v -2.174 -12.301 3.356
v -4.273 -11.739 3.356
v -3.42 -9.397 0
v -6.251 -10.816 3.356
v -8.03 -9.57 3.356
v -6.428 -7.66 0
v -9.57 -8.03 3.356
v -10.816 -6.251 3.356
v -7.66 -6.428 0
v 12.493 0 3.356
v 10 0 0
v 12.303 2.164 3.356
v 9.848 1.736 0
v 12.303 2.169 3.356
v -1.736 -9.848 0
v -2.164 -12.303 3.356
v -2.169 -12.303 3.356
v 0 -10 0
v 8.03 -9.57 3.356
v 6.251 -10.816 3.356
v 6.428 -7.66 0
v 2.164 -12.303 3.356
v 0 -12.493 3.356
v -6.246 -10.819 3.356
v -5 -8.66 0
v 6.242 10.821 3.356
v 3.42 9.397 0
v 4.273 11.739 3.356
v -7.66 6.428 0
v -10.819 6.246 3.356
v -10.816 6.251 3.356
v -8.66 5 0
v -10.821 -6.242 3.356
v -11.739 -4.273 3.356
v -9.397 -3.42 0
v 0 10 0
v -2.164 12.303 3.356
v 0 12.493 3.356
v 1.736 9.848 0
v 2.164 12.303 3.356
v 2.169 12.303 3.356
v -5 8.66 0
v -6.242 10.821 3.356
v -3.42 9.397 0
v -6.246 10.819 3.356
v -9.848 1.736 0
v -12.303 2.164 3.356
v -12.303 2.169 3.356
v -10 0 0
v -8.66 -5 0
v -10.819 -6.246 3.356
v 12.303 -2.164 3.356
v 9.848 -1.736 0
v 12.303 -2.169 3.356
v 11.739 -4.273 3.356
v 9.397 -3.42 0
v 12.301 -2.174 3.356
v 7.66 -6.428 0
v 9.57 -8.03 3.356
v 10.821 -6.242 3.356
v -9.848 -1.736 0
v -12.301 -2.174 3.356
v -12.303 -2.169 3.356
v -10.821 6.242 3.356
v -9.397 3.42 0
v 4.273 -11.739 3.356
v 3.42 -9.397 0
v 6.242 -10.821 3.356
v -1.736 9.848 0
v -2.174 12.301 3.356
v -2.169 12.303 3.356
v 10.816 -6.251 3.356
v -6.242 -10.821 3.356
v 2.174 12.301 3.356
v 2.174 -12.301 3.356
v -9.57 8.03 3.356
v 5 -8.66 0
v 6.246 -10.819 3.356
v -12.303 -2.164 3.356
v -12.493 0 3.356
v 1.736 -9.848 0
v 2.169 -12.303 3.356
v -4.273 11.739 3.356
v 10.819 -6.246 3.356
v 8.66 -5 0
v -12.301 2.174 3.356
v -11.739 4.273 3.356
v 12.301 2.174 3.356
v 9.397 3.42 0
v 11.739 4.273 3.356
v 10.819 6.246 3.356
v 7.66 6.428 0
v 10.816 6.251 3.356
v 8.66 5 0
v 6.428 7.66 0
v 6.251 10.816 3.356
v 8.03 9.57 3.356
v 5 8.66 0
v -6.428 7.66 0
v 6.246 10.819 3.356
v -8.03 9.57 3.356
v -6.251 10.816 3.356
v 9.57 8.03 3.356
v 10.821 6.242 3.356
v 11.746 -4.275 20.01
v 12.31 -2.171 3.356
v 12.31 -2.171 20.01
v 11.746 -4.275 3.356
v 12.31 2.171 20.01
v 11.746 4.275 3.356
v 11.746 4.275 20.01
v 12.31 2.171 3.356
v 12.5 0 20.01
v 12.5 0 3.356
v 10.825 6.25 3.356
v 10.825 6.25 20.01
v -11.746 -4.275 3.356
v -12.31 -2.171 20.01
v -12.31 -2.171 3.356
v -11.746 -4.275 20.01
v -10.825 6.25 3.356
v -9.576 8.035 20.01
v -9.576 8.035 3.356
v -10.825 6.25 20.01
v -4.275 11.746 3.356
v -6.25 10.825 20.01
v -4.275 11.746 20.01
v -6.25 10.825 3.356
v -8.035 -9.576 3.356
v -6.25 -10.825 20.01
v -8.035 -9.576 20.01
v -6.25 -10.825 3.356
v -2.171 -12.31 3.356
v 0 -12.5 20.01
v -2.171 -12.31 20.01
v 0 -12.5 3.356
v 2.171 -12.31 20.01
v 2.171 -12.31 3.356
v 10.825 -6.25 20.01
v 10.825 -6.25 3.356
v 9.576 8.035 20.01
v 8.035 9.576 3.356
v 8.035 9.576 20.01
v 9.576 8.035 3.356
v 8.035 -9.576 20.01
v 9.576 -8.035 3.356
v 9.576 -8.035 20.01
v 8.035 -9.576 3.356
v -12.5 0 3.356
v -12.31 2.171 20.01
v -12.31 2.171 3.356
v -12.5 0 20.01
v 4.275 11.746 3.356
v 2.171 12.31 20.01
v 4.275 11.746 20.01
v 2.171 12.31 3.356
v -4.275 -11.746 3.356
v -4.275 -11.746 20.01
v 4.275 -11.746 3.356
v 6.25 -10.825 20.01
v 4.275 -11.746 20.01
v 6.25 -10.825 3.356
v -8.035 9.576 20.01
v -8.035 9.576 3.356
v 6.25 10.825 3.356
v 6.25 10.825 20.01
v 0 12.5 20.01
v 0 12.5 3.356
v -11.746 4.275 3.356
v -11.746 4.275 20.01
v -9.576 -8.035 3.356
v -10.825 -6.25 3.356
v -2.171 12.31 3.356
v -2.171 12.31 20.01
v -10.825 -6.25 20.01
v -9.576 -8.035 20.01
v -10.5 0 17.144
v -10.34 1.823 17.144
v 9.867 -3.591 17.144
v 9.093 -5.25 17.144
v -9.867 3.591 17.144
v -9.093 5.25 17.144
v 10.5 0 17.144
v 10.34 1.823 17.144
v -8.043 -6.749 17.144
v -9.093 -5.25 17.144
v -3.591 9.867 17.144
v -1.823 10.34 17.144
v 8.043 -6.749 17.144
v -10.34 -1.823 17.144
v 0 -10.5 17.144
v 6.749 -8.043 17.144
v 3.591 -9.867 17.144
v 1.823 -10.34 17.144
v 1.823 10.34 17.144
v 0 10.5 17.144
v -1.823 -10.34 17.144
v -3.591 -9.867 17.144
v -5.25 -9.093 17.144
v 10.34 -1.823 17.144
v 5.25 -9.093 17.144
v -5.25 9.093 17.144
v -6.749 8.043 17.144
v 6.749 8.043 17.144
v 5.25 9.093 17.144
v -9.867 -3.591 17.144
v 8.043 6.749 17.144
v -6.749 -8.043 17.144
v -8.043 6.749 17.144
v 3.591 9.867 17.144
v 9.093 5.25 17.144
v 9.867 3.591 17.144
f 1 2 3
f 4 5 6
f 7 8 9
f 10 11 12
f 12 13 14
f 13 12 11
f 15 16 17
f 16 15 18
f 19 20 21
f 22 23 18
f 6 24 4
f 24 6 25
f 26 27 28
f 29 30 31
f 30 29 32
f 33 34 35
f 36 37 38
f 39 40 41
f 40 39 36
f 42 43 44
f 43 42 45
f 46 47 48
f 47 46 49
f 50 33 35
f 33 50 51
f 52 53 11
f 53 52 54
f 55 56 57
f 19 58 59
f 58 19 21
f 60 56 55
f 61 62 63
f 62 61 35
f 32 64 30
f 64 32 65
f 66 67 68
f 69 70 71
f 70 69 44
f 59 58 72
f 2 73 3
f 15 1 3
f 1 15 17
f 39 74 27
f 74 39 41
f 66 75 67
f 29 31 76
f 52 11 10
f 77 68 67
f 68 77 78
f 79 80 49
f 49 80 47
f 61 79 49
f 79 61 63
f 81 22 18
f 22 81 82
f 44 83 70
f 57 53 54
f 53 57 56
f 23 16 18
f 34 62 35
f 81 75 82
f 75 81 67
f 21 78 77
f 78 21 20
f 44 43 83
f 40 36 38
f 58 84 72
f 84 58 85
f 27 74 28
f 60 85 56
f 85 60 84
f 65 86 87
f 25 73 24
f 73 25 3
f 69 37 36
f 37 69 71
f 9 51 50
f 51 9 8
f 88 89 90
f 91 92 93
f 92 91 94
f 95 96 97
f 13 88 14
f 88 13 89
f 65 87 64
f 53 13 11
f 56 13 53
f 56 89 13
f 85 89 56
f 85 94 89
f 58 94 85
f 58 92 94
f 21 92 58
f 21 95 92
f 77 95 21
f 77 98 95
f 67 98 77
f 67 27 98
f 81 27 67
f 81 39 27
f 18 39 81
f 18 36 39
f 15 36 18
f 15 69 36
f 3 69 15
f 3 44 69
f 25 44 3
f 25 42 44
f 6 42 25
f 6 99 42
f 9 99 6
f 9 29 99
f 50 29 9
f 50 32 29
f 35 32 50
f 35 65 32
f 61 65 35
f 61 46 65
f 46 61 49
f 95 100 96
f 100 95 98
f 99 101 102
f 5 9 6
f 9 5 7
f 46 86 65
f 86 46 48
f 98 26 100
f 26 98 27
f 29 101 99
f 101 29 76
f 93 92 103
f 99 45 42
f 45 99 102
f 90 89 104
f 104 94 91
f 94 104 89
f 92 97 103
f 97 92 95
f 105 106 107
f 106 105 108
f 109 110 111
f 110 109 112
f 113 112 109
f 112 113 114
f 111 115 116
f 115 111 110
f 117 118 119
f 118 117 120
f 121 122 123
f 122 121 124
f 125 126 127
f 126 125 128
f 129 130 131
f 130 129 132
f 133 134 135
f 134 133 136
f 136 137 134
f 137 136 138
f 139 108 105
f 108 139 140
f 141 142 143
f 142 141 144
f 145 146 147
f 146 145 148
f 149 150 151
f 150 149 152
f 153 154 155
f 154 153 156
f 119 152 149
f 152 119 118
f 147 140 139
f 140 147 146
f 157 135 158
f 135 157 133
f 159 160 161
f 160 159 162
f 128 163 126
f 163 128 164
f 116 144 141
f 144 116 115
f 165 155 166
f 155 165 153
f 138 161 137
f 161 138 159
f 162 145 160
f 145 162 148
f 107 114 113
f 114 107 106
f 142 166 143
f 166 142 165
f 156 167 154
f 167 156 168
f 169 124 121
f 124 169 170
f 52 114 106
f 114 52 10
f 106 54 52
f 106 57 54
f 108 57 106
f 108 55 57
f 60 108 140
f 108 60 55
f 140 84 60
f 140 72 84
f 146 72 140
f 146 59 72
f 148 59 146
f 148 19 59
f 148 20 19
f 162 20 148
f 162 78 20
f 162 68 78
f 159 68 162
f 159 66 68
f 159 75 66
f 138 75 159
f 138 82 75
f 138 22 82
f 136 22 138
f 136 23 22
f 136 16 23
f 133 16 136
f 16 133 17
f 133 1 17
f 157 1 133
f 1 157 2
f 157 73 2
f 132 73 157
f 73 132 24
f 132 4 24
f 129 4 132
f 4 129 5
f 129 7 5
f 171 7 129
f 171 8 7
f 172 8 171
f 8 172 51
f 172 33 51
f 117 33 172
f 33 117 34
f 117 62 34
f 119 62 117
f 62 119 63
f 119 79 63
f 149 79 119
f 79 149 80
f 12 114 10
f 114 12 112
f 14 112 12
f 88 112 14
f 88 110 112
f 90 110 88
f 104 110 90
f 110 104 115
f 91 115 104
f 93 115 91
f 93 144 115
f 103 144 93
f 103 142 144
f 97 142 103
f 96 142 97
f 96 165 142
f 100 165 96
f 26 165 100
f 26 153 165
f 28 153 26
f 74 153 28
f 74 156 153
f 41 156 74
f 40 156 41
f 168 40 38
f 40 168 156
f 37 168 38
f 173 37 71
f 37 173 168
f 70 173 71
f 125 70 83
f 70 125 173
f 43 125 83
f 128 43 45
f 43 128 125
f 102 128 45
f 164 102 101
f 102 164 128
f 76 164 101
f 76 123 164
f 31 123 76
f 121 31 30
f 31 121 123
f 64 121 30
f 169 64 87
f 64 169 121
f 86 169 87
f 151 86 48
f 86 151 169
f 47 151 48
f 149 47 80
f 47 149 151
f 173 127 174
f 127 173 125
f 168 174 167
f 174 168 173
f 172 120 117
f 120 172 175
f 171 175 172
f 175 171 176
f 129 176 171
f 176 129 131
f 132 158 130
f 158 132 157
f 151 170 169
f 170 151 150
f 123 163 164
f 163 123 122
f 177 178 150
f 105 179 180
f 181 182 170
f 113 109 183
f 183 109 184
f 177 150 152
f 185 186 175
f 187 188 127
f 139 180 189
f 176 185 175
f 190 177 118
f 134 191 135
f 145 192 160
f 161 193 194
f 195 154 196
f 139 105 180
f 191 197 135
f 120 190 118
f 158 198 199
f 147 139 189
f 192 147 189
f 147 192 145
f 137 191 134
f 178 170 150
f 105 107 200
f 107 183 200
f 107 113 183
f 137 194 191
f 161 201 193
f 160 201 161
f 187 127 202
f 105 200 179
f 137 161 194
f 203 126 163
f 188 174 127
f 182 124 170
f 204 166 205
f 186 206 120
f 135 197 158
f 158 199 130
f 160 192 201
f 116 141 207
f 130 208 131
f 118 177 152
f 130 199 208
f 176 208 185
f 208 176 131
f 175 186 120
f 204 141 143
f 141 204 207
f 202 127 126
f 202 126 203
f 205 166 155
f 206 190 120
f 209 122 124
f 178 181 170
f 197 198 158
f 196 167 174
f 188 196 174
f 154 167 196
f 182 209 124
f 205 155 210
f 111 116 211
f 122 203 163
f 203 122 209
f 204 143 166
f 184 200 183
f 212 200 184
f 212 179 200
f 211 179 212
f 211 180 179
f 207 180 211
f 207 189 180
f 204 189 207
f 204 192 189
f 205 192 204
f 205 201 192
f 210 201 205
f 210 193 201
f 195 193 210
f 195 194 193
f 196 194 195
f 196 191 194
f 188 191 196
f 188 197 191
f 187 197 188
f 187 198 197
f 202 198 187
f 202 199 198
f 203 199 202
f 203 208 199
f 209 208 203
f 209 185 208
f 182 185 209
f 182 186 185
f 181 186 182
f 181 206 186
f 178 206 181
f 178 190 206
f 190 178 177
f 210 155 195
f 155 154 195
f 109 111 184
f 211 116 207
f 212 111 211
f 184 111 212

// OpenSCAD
// file: noun_1269.scad
// Public domain meeple 
// By Johan H. W. Basberg, GB
// https://thenounproject.com/search/?q=meeple&i=1269
// 

center_meeple_1 = [13.229166667,13.229166667];
size_meeple_1 = [26.454100000,26.458333333];
stroke_width_meeple_1 = 0.007000434;
color_meeple_1 = [0.00000,0.00000,0.00000];
// paths for meeple_1
points_meeple_1_1 = [ [13.227050000,1.847056250],[13.156023263,2.507769991],[12.902393331,3.125457288],[12.491358278,3.700865770],[11.948116178,4.234743066],[10.565803137,5.180894617],[8.957038802,5.969892969],[4.787883980,7.453779138],[4.289160417,7.673975000],[4.095414103,9.523410950],[3.846181771,10.530449740],[3.384249243,11.527628666],[3.050950078,11.984056943],[2.637391471,12.391863770],[2.134545291,12.735663650],[1.533383407,13.000071090],[0.824877687,13.169700594],[-0.000000000,13.229166667],[-0.824880658,13.169700594],[-1.533394775,13.000071090],[-2.134569708,12.735663650],[-2.637432813,12.391863770],[-3.051011444,11.984056943],[-3.384332959,11.527628666],[-3.846314063,10.530449740],[-4.095594971,9.523410950],[-4.204394531,8.629596257],[-4.289425000,7.673975000],[-4.788126343,7.453779138],[-8.957071875,5.969892969],[-10.565770581,5.180894617],[-11.948045898,4.234743066],[-12.491284445,3.700865770],[-12.902328735,3.125457288],[-13.155982632,2.507769991],[-13.227050000,1.847056250],[-13.148057858,1.227033953],[-12.976150069,0.723766158],[-12.723204591,0.324874162],[-12.401099382,0.017979264],[-11.596921594,-0.369334045],[-10.658640365,-0.537203385],[-8.759862207,-0.610728613],[-7.989412594,-0.714443730],[-7.464954167,-0.994833333],[-7.368345593,-1.228225999],[-7.392086263,-1.569687651],[-7.741294922,-2.534307324],[-9.231378646,-5.292758073],[-10.986078776,-8.590016243],[-11.666057943,-10.228145194],[-12.056268750,-11.745912500],[-12.086236947,-12.501731999],[-11.887233073,-12.953371615],[-11.428325684,-13.172095215],[-10.678583333,-13.229166667],[-4.473310417,-13.227843750],[-3.915184277,-13.138989225],[-3.501595052,-12.891855990],[-2.845593750,-12.039335417],[-1.295102344,-9.480120052],[-0.580318066,-8.471069499],[-0.268937073,-8.172688228],[-0.000000000,-8.064500000],[0.268861108,-8.172687712],[0.580206445,-8.471065365],[1.295003125,-9.480086979],[2.845593750,-12.039070833],[3.501462760,-12.891690625],[3.914961035,-13.138761849],[4.473045833,-13.227579167],[10.678318750,-13.228902083],[11.428098307,-13.171830632],[11.887067708,-12.953107031],[12.086083984,-12.501467415],[12.056004167,-11.745647917],[11.665891028,-10.227880611],[10.986000228,-8.589751660],[9.231411719,-5.292493490],[7.741290788,-2.534042741],[7.391984460,-1.569423067],[7.368171121,-1.227961416],[7.464689583,-0.994568750],[7.989170231,-0.714266479],[8.759676172,-0.610616992],[10.658607292,-0.537170313],[11.596954150,-0.369320093],[12.401169661,0.017983398],[12.723278424,0.324875906],[12.976214665,0.723766675],[13.148098488,1.227034018],[13.227050000,1.847056250] ];

module polygon_meeple_1() {
 color(color_meeple_1) {
  polygon(points=points_meeple_1_1);
 }
}

module meeple() {
    scale(10/size_meeple_1[0])
    linear_extrude(height=8)
    translate([-size_meeple_1[0]/2,0,0])
    translate(center_meeple_1) polygon_meeple_1();
}
// main file
use <noun_1269.scad>;

pieceWidth = 25;
pieceHeight = 20;
inset = 2;
insetAngle = 55;
tolerance = 0.5;

module dummy() {}

$fn = 36;
nudge = 0.01;
ratio = tan(insetAngle);

module baseInset() {
    cylinder(d1=pieceWidth-inset*2-tolerance*2,d2=pieceWidth,h=inset*ratio+tolerance+nudge);
}

module fitInset() {
    translate([0,0,-ratio*inset])
cylinder(d1=pieceWidth-inset*2,d2=pieceWidth,h=ratio*inset+nudge);}

module piece(bottom=false) {
    render(convexity=2)
    difference() {
        union() {
            if (bottom) cylinder(d=pieceWidth,h=inset*ratio+tolerance+nudge); else baseInset();
            translate([0,0,inset*ratio+tolerance])
            cylinder(d=pieceWidth,h=pieceHeight-inset*ratio-tolerance+nudge);
        }
        translate([0,0,pieceHeight]) fitInset();
    }
}

module dome() {
    render(convexity=0) {
        baseInset();
        translate([0,0,ratio*inset+tolerance])
        intersection() {
            translate([-pieceWidth/2,-pieceWidth/2,0])
            cube(pieceWidth);
            sphere(d=pieceWidth);
        }
    }
}


module worker() {
    scale((pieceWidth-2*inset-2)/10) meeple();
}

piece();
//dome();
//worker();
